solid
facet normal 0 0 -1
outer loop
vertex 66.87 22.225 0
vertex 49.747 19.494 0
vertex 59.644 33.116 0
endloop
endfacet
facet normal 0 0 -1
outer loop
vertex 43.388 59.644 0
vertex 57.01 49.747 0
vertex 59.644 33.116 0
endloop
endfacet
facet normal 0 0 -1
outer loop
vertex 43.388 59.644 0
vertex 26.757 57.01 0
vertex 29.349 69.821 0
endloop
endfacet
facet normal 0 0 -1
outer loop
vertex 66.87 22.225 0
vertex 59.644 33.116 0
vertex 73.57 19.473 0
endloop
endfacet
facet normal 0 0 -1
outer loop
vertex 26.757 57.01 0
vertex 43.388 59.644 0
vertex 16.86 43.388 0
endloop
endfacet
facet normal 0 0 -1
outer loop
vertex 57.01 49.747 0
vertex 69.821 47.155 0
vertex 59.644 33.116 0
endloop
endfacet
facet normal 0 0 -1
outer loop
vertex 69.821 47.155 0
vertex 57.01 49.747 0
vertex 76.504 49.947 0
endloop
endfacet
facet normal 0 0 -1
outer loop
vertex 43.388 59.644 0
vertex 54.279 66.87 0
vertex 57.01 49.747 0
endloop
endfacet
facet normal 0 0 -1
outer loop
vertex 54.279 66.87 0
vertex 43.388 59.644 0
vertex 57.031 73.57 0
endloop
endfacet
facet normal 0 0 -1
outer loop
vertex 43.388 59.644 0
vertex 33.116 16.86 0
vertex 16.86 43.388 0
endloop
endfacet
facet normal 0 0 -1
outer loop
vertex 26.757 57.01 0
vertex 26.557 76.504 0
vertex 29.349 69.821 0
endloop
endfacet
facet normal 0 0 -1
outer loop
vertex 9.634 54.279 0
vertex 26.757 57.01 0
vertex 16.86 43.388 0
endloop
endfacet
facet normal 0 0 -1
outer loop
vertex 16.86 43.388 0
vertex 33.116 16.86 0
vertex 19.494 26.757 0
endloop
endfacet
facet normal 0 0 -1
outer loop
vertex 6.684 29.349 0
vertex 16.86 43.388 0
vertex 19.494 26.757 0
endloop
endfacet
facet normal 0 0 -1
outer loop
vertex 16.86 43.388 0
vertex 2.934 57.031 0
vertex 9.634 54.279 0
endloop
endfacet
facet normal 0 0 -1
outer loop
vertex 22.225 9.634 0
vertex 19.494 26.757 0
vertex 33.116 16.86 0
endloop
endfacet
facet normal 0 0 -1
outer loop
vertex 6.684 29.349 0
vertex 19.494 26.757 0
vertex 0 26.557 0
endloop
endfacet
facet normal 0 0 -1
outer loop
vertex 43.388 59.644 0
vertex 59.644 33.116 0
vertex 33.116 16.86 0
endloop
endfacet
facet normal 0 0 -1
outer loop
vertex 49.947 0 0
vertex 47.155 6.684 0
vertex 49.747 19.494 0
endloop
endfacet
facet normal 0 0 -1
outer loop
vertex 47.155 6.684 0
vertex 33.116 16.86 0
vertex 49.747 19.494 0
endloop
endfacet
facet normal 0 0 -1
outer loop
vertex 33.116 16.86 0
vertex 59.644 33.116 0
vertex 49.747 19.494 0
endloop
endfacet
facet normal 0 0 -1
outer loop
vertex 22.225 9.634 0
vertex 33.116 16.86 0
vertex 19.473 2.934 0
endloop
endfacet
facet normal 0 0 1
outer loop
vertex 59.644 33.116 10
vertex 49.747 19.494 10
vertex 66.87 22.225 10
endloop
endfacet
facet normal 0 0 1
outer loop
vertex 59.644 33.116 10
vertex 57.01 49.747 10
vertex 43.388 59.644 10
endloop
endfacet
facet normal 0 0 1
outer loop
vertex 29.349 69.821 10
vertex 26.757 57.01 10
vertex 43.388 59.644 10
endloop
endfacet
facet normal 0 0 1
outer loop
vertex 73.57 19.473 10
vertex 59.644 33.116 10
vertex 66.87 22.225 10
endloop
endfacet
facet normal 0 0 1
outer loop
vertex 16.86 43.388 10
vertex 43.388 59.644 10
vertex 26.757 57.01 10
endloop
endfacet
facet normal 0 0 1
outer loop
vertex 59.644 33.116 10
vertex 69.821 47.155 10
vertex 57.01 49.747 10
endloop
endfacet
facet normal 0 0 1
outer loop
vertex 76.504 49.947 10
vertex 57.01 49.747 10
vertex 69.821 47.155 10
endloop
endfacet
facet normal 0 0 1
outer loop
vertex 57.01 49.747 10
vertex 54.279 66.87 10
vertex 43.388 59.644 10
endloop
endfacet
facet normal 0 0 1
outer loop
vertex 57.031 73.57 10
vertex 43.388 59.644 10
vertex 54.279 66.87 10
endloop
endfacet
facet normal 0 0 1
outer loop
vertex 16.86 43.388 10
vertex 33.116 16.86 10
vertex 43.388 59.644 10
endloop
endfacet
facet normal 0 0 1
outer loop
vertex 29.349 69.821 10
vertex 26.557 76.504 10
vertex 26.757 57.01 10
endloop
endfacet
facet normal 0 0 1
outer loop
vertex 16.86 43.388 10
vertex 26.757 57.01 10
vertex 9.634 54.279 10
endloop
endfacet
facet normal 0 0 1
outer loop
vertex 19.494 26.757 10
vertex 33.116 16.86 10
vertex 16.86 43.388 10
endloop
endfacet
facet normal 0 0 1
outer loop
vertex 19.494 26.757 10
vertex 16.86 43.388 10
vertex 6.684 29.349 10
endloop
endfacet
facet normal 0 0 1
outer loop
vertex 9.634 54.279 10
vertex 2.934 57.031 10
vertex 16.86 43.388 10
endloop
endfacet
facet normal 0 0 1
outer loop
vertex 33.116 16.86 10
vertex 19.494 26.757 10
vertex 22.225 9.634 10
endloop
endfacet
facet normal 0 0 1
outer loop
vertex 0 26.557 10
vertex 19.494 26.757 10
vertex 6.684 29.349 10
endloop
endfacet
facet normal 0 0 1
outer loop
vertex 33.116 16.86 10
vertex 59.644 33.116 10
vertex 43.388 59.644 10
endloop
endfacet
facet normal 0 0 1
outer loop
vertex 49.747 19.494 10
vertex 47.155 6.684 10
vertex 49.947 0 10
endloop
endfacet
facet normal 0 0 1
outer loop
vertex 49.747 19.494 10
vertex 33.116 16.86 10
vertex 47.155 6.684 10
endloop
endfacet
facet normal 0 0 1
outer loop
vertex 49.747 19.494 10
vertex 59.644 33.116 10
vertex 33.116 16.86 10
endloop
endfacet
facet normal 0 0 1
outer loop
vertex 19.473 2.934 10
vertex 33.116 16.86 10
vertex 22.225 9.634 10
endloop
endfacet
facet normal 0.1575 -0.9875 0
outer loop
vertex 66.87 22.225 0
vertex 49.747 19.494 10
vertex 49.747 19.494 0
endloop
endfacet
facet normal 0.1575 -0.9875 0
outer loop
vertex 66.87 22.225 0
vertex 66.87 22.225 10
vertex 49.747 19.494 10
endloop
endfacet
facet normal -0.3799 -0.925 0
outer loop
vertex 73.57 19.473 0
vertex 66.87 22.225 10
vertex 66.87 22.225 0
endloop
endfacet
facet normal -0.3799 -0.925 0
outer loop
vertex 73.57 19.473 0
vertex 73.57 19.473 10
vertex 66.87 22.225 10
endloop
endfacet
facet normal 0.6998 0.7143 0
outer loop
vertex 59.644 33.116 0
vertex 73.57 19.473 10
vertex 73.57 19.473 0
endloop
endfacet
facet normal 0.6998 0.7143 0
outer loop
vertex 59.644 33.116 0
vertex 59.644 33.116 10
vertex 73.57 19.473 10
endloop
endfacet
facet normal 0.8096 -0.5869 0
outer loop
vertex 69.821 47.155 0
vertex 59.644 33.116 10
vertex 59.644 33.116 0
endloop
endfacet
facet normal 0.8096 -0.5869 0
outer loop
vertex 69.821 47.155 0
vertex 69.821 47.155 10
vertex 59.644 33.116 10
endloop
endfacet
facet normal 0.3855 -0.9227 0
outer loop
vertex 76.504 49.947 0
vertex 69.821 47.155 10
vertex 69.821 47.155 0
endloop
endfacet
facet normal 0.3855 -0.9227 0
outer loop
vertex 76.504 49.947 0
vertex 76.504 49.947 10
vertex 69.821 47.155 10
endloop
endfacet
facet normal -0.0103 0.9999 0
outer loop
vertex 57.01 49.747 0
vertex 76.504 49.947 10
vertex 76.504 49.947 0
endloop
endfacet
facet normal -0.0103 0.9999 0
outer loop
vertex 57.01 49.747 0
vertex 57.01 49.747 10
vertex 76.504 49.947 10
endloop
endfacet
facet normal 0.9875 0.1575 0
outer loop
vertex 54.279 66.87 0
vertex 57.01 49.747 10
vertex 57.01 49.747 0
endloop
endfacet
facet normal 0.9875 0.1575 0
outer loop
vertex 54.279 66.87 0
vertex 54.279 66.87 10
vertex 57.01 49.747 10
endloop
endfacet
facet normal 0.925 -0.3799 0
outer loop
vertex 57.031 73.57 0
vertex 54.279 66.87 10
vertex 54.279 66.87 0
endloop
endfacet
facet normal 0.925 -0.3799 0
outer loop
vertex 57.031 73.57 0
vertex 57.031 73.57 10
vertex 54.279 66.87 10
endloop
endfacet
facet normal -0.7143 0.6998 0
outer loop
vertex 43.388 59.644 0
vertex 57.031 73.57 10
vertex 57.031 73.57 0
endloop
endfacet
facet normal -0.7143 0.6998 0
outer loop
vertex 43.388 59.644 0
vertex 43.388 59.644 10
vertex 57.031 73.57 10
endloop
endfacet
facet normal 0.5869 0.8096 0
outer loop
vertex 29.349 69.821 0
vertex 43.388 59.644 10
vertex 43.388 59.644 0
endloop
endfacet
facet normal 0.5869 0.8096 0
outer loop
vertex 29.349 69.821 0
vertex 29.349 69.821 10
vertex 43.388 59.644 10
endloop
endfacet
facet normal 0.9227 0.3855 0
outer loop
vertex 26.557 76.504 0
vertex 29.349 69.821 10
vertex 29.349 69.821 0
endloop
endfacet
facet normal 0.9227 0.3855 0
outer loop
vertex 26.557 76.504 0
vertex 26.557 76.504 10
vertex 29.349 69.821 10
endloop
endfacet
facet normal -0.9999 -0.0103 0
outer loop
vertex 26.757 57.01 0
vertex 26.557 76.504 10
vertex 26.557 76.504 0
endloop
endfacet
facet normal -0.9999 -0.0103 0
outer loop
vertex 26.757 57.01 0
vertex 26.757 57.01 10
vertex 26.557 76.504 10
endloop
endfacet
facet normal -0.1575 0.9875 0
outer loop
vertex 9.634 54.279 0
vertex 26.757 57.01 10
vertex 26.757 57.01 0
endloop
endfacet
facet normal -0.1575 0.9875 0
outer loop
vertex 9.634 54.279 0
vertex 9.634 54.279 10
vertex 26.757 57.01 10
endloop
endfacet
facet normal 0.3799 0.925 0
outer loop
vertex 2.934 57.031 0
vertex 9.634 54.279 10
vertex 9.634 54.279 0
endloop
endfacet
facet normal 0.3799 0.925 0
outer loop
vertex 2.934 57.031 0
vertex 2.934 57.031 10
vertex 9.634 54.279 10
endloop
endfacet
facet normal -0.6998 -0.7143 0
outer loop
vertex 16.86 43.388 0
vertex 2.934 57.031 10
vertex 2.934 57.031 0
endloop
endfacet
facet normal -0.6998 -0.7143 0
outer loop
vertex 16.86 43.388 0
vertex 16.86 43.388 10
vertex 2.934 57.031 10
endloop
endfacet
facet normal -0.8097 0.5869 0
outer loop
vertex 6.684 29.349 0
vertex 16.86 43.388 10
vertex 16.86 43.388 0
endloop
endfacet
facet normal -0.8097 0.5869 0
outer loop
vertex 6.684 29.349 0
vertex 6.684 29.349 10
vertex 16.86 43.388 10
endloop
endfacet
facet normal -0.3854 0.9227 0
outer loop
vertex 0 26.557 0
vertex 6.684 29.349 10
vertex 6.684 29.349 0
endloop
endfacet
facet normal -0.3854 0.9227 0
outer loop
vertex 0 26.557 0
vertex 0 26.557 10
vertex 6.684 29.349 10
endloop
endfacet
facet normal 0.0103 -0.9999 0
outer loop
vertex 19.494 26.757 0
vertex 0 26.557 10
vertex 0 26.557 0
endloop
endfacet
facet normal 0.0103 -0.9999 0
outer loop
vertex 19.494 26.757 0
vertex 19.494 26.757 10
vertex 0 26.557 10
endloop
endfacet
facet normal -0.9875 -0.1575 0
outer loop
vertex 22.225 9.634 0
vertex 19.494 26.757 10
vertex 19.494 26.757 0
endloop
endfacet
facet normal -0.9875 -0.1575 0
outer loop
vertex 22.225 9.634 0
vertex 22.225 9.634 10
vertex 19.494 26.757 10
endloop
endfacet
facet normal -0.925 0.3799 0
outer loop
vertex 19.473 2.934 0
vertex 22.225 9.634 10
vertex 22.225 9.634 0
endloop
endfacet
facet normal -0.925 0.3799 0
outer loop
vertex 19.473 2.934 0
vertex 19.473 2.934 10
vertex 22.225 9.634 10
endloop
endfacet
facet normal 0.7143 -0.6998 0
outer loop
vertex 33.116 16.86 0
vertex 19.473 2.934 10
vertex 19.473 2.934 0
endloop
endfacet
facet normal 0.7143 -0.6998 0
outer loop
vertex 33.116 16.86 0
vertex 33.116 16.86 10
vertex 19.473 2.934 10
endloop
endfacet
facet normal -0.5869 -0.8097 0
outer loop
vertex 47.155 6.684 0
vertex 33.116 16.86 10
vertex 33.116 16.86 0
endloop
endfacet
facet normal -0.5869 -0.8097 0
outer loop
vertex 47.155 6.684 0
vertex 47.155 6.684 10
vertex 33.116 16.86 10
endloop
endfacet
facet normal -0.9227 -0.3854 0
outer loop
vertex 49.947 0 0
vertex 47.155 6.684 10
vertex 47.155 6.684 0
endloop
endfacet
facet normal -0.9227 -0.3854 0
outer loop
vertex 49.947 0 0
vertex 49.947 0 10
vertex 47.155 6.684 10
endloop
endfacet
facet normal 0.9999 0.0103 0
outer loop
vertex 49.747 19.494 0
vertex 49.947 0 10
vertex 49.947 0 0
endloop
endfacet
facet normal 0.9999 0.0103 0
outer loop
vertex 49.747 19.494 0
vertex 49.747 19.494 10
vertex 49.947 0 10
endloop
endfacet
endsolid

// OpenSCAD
$fn = 32;

// ----------------------------------------------------------------------
// Fan rotor section: 8 blades, 22 mm hub radius, 18 mm blades
// ----------------------------------------------------------------------

// --- parameters (mm) ---
profile_height = 10;      // extrusion height
profile_points = 24;      // points of the closed outline

profile = [[59.644, 33.116], [69.821, 47.155], [76.504, 49.947], [57.01, 49.747], [54.279, 66.87], [57.031, 73.57], [43.388, 59.644], [29.349, 69.821], [26.557, 76.504], [26.757, 57.01], [9.634, 54.279], [2.934, 57.031], [16.86, 43.388], [6.684, 29.349], [0, 26.557], [19.494, 26.757], [22.225, 9.634], [19.473, 2.934], [33.116, 16.86], [47.155, 6.684], [49.947, 0], [49.747, 19.494], [66.87, 22.225], [73.57, 19.473]];  // single closed polygon, 24 points, counter clockwise

// --- the one profile operation ---
linear_extrude(height = profile_height) polygon(points = profile);
